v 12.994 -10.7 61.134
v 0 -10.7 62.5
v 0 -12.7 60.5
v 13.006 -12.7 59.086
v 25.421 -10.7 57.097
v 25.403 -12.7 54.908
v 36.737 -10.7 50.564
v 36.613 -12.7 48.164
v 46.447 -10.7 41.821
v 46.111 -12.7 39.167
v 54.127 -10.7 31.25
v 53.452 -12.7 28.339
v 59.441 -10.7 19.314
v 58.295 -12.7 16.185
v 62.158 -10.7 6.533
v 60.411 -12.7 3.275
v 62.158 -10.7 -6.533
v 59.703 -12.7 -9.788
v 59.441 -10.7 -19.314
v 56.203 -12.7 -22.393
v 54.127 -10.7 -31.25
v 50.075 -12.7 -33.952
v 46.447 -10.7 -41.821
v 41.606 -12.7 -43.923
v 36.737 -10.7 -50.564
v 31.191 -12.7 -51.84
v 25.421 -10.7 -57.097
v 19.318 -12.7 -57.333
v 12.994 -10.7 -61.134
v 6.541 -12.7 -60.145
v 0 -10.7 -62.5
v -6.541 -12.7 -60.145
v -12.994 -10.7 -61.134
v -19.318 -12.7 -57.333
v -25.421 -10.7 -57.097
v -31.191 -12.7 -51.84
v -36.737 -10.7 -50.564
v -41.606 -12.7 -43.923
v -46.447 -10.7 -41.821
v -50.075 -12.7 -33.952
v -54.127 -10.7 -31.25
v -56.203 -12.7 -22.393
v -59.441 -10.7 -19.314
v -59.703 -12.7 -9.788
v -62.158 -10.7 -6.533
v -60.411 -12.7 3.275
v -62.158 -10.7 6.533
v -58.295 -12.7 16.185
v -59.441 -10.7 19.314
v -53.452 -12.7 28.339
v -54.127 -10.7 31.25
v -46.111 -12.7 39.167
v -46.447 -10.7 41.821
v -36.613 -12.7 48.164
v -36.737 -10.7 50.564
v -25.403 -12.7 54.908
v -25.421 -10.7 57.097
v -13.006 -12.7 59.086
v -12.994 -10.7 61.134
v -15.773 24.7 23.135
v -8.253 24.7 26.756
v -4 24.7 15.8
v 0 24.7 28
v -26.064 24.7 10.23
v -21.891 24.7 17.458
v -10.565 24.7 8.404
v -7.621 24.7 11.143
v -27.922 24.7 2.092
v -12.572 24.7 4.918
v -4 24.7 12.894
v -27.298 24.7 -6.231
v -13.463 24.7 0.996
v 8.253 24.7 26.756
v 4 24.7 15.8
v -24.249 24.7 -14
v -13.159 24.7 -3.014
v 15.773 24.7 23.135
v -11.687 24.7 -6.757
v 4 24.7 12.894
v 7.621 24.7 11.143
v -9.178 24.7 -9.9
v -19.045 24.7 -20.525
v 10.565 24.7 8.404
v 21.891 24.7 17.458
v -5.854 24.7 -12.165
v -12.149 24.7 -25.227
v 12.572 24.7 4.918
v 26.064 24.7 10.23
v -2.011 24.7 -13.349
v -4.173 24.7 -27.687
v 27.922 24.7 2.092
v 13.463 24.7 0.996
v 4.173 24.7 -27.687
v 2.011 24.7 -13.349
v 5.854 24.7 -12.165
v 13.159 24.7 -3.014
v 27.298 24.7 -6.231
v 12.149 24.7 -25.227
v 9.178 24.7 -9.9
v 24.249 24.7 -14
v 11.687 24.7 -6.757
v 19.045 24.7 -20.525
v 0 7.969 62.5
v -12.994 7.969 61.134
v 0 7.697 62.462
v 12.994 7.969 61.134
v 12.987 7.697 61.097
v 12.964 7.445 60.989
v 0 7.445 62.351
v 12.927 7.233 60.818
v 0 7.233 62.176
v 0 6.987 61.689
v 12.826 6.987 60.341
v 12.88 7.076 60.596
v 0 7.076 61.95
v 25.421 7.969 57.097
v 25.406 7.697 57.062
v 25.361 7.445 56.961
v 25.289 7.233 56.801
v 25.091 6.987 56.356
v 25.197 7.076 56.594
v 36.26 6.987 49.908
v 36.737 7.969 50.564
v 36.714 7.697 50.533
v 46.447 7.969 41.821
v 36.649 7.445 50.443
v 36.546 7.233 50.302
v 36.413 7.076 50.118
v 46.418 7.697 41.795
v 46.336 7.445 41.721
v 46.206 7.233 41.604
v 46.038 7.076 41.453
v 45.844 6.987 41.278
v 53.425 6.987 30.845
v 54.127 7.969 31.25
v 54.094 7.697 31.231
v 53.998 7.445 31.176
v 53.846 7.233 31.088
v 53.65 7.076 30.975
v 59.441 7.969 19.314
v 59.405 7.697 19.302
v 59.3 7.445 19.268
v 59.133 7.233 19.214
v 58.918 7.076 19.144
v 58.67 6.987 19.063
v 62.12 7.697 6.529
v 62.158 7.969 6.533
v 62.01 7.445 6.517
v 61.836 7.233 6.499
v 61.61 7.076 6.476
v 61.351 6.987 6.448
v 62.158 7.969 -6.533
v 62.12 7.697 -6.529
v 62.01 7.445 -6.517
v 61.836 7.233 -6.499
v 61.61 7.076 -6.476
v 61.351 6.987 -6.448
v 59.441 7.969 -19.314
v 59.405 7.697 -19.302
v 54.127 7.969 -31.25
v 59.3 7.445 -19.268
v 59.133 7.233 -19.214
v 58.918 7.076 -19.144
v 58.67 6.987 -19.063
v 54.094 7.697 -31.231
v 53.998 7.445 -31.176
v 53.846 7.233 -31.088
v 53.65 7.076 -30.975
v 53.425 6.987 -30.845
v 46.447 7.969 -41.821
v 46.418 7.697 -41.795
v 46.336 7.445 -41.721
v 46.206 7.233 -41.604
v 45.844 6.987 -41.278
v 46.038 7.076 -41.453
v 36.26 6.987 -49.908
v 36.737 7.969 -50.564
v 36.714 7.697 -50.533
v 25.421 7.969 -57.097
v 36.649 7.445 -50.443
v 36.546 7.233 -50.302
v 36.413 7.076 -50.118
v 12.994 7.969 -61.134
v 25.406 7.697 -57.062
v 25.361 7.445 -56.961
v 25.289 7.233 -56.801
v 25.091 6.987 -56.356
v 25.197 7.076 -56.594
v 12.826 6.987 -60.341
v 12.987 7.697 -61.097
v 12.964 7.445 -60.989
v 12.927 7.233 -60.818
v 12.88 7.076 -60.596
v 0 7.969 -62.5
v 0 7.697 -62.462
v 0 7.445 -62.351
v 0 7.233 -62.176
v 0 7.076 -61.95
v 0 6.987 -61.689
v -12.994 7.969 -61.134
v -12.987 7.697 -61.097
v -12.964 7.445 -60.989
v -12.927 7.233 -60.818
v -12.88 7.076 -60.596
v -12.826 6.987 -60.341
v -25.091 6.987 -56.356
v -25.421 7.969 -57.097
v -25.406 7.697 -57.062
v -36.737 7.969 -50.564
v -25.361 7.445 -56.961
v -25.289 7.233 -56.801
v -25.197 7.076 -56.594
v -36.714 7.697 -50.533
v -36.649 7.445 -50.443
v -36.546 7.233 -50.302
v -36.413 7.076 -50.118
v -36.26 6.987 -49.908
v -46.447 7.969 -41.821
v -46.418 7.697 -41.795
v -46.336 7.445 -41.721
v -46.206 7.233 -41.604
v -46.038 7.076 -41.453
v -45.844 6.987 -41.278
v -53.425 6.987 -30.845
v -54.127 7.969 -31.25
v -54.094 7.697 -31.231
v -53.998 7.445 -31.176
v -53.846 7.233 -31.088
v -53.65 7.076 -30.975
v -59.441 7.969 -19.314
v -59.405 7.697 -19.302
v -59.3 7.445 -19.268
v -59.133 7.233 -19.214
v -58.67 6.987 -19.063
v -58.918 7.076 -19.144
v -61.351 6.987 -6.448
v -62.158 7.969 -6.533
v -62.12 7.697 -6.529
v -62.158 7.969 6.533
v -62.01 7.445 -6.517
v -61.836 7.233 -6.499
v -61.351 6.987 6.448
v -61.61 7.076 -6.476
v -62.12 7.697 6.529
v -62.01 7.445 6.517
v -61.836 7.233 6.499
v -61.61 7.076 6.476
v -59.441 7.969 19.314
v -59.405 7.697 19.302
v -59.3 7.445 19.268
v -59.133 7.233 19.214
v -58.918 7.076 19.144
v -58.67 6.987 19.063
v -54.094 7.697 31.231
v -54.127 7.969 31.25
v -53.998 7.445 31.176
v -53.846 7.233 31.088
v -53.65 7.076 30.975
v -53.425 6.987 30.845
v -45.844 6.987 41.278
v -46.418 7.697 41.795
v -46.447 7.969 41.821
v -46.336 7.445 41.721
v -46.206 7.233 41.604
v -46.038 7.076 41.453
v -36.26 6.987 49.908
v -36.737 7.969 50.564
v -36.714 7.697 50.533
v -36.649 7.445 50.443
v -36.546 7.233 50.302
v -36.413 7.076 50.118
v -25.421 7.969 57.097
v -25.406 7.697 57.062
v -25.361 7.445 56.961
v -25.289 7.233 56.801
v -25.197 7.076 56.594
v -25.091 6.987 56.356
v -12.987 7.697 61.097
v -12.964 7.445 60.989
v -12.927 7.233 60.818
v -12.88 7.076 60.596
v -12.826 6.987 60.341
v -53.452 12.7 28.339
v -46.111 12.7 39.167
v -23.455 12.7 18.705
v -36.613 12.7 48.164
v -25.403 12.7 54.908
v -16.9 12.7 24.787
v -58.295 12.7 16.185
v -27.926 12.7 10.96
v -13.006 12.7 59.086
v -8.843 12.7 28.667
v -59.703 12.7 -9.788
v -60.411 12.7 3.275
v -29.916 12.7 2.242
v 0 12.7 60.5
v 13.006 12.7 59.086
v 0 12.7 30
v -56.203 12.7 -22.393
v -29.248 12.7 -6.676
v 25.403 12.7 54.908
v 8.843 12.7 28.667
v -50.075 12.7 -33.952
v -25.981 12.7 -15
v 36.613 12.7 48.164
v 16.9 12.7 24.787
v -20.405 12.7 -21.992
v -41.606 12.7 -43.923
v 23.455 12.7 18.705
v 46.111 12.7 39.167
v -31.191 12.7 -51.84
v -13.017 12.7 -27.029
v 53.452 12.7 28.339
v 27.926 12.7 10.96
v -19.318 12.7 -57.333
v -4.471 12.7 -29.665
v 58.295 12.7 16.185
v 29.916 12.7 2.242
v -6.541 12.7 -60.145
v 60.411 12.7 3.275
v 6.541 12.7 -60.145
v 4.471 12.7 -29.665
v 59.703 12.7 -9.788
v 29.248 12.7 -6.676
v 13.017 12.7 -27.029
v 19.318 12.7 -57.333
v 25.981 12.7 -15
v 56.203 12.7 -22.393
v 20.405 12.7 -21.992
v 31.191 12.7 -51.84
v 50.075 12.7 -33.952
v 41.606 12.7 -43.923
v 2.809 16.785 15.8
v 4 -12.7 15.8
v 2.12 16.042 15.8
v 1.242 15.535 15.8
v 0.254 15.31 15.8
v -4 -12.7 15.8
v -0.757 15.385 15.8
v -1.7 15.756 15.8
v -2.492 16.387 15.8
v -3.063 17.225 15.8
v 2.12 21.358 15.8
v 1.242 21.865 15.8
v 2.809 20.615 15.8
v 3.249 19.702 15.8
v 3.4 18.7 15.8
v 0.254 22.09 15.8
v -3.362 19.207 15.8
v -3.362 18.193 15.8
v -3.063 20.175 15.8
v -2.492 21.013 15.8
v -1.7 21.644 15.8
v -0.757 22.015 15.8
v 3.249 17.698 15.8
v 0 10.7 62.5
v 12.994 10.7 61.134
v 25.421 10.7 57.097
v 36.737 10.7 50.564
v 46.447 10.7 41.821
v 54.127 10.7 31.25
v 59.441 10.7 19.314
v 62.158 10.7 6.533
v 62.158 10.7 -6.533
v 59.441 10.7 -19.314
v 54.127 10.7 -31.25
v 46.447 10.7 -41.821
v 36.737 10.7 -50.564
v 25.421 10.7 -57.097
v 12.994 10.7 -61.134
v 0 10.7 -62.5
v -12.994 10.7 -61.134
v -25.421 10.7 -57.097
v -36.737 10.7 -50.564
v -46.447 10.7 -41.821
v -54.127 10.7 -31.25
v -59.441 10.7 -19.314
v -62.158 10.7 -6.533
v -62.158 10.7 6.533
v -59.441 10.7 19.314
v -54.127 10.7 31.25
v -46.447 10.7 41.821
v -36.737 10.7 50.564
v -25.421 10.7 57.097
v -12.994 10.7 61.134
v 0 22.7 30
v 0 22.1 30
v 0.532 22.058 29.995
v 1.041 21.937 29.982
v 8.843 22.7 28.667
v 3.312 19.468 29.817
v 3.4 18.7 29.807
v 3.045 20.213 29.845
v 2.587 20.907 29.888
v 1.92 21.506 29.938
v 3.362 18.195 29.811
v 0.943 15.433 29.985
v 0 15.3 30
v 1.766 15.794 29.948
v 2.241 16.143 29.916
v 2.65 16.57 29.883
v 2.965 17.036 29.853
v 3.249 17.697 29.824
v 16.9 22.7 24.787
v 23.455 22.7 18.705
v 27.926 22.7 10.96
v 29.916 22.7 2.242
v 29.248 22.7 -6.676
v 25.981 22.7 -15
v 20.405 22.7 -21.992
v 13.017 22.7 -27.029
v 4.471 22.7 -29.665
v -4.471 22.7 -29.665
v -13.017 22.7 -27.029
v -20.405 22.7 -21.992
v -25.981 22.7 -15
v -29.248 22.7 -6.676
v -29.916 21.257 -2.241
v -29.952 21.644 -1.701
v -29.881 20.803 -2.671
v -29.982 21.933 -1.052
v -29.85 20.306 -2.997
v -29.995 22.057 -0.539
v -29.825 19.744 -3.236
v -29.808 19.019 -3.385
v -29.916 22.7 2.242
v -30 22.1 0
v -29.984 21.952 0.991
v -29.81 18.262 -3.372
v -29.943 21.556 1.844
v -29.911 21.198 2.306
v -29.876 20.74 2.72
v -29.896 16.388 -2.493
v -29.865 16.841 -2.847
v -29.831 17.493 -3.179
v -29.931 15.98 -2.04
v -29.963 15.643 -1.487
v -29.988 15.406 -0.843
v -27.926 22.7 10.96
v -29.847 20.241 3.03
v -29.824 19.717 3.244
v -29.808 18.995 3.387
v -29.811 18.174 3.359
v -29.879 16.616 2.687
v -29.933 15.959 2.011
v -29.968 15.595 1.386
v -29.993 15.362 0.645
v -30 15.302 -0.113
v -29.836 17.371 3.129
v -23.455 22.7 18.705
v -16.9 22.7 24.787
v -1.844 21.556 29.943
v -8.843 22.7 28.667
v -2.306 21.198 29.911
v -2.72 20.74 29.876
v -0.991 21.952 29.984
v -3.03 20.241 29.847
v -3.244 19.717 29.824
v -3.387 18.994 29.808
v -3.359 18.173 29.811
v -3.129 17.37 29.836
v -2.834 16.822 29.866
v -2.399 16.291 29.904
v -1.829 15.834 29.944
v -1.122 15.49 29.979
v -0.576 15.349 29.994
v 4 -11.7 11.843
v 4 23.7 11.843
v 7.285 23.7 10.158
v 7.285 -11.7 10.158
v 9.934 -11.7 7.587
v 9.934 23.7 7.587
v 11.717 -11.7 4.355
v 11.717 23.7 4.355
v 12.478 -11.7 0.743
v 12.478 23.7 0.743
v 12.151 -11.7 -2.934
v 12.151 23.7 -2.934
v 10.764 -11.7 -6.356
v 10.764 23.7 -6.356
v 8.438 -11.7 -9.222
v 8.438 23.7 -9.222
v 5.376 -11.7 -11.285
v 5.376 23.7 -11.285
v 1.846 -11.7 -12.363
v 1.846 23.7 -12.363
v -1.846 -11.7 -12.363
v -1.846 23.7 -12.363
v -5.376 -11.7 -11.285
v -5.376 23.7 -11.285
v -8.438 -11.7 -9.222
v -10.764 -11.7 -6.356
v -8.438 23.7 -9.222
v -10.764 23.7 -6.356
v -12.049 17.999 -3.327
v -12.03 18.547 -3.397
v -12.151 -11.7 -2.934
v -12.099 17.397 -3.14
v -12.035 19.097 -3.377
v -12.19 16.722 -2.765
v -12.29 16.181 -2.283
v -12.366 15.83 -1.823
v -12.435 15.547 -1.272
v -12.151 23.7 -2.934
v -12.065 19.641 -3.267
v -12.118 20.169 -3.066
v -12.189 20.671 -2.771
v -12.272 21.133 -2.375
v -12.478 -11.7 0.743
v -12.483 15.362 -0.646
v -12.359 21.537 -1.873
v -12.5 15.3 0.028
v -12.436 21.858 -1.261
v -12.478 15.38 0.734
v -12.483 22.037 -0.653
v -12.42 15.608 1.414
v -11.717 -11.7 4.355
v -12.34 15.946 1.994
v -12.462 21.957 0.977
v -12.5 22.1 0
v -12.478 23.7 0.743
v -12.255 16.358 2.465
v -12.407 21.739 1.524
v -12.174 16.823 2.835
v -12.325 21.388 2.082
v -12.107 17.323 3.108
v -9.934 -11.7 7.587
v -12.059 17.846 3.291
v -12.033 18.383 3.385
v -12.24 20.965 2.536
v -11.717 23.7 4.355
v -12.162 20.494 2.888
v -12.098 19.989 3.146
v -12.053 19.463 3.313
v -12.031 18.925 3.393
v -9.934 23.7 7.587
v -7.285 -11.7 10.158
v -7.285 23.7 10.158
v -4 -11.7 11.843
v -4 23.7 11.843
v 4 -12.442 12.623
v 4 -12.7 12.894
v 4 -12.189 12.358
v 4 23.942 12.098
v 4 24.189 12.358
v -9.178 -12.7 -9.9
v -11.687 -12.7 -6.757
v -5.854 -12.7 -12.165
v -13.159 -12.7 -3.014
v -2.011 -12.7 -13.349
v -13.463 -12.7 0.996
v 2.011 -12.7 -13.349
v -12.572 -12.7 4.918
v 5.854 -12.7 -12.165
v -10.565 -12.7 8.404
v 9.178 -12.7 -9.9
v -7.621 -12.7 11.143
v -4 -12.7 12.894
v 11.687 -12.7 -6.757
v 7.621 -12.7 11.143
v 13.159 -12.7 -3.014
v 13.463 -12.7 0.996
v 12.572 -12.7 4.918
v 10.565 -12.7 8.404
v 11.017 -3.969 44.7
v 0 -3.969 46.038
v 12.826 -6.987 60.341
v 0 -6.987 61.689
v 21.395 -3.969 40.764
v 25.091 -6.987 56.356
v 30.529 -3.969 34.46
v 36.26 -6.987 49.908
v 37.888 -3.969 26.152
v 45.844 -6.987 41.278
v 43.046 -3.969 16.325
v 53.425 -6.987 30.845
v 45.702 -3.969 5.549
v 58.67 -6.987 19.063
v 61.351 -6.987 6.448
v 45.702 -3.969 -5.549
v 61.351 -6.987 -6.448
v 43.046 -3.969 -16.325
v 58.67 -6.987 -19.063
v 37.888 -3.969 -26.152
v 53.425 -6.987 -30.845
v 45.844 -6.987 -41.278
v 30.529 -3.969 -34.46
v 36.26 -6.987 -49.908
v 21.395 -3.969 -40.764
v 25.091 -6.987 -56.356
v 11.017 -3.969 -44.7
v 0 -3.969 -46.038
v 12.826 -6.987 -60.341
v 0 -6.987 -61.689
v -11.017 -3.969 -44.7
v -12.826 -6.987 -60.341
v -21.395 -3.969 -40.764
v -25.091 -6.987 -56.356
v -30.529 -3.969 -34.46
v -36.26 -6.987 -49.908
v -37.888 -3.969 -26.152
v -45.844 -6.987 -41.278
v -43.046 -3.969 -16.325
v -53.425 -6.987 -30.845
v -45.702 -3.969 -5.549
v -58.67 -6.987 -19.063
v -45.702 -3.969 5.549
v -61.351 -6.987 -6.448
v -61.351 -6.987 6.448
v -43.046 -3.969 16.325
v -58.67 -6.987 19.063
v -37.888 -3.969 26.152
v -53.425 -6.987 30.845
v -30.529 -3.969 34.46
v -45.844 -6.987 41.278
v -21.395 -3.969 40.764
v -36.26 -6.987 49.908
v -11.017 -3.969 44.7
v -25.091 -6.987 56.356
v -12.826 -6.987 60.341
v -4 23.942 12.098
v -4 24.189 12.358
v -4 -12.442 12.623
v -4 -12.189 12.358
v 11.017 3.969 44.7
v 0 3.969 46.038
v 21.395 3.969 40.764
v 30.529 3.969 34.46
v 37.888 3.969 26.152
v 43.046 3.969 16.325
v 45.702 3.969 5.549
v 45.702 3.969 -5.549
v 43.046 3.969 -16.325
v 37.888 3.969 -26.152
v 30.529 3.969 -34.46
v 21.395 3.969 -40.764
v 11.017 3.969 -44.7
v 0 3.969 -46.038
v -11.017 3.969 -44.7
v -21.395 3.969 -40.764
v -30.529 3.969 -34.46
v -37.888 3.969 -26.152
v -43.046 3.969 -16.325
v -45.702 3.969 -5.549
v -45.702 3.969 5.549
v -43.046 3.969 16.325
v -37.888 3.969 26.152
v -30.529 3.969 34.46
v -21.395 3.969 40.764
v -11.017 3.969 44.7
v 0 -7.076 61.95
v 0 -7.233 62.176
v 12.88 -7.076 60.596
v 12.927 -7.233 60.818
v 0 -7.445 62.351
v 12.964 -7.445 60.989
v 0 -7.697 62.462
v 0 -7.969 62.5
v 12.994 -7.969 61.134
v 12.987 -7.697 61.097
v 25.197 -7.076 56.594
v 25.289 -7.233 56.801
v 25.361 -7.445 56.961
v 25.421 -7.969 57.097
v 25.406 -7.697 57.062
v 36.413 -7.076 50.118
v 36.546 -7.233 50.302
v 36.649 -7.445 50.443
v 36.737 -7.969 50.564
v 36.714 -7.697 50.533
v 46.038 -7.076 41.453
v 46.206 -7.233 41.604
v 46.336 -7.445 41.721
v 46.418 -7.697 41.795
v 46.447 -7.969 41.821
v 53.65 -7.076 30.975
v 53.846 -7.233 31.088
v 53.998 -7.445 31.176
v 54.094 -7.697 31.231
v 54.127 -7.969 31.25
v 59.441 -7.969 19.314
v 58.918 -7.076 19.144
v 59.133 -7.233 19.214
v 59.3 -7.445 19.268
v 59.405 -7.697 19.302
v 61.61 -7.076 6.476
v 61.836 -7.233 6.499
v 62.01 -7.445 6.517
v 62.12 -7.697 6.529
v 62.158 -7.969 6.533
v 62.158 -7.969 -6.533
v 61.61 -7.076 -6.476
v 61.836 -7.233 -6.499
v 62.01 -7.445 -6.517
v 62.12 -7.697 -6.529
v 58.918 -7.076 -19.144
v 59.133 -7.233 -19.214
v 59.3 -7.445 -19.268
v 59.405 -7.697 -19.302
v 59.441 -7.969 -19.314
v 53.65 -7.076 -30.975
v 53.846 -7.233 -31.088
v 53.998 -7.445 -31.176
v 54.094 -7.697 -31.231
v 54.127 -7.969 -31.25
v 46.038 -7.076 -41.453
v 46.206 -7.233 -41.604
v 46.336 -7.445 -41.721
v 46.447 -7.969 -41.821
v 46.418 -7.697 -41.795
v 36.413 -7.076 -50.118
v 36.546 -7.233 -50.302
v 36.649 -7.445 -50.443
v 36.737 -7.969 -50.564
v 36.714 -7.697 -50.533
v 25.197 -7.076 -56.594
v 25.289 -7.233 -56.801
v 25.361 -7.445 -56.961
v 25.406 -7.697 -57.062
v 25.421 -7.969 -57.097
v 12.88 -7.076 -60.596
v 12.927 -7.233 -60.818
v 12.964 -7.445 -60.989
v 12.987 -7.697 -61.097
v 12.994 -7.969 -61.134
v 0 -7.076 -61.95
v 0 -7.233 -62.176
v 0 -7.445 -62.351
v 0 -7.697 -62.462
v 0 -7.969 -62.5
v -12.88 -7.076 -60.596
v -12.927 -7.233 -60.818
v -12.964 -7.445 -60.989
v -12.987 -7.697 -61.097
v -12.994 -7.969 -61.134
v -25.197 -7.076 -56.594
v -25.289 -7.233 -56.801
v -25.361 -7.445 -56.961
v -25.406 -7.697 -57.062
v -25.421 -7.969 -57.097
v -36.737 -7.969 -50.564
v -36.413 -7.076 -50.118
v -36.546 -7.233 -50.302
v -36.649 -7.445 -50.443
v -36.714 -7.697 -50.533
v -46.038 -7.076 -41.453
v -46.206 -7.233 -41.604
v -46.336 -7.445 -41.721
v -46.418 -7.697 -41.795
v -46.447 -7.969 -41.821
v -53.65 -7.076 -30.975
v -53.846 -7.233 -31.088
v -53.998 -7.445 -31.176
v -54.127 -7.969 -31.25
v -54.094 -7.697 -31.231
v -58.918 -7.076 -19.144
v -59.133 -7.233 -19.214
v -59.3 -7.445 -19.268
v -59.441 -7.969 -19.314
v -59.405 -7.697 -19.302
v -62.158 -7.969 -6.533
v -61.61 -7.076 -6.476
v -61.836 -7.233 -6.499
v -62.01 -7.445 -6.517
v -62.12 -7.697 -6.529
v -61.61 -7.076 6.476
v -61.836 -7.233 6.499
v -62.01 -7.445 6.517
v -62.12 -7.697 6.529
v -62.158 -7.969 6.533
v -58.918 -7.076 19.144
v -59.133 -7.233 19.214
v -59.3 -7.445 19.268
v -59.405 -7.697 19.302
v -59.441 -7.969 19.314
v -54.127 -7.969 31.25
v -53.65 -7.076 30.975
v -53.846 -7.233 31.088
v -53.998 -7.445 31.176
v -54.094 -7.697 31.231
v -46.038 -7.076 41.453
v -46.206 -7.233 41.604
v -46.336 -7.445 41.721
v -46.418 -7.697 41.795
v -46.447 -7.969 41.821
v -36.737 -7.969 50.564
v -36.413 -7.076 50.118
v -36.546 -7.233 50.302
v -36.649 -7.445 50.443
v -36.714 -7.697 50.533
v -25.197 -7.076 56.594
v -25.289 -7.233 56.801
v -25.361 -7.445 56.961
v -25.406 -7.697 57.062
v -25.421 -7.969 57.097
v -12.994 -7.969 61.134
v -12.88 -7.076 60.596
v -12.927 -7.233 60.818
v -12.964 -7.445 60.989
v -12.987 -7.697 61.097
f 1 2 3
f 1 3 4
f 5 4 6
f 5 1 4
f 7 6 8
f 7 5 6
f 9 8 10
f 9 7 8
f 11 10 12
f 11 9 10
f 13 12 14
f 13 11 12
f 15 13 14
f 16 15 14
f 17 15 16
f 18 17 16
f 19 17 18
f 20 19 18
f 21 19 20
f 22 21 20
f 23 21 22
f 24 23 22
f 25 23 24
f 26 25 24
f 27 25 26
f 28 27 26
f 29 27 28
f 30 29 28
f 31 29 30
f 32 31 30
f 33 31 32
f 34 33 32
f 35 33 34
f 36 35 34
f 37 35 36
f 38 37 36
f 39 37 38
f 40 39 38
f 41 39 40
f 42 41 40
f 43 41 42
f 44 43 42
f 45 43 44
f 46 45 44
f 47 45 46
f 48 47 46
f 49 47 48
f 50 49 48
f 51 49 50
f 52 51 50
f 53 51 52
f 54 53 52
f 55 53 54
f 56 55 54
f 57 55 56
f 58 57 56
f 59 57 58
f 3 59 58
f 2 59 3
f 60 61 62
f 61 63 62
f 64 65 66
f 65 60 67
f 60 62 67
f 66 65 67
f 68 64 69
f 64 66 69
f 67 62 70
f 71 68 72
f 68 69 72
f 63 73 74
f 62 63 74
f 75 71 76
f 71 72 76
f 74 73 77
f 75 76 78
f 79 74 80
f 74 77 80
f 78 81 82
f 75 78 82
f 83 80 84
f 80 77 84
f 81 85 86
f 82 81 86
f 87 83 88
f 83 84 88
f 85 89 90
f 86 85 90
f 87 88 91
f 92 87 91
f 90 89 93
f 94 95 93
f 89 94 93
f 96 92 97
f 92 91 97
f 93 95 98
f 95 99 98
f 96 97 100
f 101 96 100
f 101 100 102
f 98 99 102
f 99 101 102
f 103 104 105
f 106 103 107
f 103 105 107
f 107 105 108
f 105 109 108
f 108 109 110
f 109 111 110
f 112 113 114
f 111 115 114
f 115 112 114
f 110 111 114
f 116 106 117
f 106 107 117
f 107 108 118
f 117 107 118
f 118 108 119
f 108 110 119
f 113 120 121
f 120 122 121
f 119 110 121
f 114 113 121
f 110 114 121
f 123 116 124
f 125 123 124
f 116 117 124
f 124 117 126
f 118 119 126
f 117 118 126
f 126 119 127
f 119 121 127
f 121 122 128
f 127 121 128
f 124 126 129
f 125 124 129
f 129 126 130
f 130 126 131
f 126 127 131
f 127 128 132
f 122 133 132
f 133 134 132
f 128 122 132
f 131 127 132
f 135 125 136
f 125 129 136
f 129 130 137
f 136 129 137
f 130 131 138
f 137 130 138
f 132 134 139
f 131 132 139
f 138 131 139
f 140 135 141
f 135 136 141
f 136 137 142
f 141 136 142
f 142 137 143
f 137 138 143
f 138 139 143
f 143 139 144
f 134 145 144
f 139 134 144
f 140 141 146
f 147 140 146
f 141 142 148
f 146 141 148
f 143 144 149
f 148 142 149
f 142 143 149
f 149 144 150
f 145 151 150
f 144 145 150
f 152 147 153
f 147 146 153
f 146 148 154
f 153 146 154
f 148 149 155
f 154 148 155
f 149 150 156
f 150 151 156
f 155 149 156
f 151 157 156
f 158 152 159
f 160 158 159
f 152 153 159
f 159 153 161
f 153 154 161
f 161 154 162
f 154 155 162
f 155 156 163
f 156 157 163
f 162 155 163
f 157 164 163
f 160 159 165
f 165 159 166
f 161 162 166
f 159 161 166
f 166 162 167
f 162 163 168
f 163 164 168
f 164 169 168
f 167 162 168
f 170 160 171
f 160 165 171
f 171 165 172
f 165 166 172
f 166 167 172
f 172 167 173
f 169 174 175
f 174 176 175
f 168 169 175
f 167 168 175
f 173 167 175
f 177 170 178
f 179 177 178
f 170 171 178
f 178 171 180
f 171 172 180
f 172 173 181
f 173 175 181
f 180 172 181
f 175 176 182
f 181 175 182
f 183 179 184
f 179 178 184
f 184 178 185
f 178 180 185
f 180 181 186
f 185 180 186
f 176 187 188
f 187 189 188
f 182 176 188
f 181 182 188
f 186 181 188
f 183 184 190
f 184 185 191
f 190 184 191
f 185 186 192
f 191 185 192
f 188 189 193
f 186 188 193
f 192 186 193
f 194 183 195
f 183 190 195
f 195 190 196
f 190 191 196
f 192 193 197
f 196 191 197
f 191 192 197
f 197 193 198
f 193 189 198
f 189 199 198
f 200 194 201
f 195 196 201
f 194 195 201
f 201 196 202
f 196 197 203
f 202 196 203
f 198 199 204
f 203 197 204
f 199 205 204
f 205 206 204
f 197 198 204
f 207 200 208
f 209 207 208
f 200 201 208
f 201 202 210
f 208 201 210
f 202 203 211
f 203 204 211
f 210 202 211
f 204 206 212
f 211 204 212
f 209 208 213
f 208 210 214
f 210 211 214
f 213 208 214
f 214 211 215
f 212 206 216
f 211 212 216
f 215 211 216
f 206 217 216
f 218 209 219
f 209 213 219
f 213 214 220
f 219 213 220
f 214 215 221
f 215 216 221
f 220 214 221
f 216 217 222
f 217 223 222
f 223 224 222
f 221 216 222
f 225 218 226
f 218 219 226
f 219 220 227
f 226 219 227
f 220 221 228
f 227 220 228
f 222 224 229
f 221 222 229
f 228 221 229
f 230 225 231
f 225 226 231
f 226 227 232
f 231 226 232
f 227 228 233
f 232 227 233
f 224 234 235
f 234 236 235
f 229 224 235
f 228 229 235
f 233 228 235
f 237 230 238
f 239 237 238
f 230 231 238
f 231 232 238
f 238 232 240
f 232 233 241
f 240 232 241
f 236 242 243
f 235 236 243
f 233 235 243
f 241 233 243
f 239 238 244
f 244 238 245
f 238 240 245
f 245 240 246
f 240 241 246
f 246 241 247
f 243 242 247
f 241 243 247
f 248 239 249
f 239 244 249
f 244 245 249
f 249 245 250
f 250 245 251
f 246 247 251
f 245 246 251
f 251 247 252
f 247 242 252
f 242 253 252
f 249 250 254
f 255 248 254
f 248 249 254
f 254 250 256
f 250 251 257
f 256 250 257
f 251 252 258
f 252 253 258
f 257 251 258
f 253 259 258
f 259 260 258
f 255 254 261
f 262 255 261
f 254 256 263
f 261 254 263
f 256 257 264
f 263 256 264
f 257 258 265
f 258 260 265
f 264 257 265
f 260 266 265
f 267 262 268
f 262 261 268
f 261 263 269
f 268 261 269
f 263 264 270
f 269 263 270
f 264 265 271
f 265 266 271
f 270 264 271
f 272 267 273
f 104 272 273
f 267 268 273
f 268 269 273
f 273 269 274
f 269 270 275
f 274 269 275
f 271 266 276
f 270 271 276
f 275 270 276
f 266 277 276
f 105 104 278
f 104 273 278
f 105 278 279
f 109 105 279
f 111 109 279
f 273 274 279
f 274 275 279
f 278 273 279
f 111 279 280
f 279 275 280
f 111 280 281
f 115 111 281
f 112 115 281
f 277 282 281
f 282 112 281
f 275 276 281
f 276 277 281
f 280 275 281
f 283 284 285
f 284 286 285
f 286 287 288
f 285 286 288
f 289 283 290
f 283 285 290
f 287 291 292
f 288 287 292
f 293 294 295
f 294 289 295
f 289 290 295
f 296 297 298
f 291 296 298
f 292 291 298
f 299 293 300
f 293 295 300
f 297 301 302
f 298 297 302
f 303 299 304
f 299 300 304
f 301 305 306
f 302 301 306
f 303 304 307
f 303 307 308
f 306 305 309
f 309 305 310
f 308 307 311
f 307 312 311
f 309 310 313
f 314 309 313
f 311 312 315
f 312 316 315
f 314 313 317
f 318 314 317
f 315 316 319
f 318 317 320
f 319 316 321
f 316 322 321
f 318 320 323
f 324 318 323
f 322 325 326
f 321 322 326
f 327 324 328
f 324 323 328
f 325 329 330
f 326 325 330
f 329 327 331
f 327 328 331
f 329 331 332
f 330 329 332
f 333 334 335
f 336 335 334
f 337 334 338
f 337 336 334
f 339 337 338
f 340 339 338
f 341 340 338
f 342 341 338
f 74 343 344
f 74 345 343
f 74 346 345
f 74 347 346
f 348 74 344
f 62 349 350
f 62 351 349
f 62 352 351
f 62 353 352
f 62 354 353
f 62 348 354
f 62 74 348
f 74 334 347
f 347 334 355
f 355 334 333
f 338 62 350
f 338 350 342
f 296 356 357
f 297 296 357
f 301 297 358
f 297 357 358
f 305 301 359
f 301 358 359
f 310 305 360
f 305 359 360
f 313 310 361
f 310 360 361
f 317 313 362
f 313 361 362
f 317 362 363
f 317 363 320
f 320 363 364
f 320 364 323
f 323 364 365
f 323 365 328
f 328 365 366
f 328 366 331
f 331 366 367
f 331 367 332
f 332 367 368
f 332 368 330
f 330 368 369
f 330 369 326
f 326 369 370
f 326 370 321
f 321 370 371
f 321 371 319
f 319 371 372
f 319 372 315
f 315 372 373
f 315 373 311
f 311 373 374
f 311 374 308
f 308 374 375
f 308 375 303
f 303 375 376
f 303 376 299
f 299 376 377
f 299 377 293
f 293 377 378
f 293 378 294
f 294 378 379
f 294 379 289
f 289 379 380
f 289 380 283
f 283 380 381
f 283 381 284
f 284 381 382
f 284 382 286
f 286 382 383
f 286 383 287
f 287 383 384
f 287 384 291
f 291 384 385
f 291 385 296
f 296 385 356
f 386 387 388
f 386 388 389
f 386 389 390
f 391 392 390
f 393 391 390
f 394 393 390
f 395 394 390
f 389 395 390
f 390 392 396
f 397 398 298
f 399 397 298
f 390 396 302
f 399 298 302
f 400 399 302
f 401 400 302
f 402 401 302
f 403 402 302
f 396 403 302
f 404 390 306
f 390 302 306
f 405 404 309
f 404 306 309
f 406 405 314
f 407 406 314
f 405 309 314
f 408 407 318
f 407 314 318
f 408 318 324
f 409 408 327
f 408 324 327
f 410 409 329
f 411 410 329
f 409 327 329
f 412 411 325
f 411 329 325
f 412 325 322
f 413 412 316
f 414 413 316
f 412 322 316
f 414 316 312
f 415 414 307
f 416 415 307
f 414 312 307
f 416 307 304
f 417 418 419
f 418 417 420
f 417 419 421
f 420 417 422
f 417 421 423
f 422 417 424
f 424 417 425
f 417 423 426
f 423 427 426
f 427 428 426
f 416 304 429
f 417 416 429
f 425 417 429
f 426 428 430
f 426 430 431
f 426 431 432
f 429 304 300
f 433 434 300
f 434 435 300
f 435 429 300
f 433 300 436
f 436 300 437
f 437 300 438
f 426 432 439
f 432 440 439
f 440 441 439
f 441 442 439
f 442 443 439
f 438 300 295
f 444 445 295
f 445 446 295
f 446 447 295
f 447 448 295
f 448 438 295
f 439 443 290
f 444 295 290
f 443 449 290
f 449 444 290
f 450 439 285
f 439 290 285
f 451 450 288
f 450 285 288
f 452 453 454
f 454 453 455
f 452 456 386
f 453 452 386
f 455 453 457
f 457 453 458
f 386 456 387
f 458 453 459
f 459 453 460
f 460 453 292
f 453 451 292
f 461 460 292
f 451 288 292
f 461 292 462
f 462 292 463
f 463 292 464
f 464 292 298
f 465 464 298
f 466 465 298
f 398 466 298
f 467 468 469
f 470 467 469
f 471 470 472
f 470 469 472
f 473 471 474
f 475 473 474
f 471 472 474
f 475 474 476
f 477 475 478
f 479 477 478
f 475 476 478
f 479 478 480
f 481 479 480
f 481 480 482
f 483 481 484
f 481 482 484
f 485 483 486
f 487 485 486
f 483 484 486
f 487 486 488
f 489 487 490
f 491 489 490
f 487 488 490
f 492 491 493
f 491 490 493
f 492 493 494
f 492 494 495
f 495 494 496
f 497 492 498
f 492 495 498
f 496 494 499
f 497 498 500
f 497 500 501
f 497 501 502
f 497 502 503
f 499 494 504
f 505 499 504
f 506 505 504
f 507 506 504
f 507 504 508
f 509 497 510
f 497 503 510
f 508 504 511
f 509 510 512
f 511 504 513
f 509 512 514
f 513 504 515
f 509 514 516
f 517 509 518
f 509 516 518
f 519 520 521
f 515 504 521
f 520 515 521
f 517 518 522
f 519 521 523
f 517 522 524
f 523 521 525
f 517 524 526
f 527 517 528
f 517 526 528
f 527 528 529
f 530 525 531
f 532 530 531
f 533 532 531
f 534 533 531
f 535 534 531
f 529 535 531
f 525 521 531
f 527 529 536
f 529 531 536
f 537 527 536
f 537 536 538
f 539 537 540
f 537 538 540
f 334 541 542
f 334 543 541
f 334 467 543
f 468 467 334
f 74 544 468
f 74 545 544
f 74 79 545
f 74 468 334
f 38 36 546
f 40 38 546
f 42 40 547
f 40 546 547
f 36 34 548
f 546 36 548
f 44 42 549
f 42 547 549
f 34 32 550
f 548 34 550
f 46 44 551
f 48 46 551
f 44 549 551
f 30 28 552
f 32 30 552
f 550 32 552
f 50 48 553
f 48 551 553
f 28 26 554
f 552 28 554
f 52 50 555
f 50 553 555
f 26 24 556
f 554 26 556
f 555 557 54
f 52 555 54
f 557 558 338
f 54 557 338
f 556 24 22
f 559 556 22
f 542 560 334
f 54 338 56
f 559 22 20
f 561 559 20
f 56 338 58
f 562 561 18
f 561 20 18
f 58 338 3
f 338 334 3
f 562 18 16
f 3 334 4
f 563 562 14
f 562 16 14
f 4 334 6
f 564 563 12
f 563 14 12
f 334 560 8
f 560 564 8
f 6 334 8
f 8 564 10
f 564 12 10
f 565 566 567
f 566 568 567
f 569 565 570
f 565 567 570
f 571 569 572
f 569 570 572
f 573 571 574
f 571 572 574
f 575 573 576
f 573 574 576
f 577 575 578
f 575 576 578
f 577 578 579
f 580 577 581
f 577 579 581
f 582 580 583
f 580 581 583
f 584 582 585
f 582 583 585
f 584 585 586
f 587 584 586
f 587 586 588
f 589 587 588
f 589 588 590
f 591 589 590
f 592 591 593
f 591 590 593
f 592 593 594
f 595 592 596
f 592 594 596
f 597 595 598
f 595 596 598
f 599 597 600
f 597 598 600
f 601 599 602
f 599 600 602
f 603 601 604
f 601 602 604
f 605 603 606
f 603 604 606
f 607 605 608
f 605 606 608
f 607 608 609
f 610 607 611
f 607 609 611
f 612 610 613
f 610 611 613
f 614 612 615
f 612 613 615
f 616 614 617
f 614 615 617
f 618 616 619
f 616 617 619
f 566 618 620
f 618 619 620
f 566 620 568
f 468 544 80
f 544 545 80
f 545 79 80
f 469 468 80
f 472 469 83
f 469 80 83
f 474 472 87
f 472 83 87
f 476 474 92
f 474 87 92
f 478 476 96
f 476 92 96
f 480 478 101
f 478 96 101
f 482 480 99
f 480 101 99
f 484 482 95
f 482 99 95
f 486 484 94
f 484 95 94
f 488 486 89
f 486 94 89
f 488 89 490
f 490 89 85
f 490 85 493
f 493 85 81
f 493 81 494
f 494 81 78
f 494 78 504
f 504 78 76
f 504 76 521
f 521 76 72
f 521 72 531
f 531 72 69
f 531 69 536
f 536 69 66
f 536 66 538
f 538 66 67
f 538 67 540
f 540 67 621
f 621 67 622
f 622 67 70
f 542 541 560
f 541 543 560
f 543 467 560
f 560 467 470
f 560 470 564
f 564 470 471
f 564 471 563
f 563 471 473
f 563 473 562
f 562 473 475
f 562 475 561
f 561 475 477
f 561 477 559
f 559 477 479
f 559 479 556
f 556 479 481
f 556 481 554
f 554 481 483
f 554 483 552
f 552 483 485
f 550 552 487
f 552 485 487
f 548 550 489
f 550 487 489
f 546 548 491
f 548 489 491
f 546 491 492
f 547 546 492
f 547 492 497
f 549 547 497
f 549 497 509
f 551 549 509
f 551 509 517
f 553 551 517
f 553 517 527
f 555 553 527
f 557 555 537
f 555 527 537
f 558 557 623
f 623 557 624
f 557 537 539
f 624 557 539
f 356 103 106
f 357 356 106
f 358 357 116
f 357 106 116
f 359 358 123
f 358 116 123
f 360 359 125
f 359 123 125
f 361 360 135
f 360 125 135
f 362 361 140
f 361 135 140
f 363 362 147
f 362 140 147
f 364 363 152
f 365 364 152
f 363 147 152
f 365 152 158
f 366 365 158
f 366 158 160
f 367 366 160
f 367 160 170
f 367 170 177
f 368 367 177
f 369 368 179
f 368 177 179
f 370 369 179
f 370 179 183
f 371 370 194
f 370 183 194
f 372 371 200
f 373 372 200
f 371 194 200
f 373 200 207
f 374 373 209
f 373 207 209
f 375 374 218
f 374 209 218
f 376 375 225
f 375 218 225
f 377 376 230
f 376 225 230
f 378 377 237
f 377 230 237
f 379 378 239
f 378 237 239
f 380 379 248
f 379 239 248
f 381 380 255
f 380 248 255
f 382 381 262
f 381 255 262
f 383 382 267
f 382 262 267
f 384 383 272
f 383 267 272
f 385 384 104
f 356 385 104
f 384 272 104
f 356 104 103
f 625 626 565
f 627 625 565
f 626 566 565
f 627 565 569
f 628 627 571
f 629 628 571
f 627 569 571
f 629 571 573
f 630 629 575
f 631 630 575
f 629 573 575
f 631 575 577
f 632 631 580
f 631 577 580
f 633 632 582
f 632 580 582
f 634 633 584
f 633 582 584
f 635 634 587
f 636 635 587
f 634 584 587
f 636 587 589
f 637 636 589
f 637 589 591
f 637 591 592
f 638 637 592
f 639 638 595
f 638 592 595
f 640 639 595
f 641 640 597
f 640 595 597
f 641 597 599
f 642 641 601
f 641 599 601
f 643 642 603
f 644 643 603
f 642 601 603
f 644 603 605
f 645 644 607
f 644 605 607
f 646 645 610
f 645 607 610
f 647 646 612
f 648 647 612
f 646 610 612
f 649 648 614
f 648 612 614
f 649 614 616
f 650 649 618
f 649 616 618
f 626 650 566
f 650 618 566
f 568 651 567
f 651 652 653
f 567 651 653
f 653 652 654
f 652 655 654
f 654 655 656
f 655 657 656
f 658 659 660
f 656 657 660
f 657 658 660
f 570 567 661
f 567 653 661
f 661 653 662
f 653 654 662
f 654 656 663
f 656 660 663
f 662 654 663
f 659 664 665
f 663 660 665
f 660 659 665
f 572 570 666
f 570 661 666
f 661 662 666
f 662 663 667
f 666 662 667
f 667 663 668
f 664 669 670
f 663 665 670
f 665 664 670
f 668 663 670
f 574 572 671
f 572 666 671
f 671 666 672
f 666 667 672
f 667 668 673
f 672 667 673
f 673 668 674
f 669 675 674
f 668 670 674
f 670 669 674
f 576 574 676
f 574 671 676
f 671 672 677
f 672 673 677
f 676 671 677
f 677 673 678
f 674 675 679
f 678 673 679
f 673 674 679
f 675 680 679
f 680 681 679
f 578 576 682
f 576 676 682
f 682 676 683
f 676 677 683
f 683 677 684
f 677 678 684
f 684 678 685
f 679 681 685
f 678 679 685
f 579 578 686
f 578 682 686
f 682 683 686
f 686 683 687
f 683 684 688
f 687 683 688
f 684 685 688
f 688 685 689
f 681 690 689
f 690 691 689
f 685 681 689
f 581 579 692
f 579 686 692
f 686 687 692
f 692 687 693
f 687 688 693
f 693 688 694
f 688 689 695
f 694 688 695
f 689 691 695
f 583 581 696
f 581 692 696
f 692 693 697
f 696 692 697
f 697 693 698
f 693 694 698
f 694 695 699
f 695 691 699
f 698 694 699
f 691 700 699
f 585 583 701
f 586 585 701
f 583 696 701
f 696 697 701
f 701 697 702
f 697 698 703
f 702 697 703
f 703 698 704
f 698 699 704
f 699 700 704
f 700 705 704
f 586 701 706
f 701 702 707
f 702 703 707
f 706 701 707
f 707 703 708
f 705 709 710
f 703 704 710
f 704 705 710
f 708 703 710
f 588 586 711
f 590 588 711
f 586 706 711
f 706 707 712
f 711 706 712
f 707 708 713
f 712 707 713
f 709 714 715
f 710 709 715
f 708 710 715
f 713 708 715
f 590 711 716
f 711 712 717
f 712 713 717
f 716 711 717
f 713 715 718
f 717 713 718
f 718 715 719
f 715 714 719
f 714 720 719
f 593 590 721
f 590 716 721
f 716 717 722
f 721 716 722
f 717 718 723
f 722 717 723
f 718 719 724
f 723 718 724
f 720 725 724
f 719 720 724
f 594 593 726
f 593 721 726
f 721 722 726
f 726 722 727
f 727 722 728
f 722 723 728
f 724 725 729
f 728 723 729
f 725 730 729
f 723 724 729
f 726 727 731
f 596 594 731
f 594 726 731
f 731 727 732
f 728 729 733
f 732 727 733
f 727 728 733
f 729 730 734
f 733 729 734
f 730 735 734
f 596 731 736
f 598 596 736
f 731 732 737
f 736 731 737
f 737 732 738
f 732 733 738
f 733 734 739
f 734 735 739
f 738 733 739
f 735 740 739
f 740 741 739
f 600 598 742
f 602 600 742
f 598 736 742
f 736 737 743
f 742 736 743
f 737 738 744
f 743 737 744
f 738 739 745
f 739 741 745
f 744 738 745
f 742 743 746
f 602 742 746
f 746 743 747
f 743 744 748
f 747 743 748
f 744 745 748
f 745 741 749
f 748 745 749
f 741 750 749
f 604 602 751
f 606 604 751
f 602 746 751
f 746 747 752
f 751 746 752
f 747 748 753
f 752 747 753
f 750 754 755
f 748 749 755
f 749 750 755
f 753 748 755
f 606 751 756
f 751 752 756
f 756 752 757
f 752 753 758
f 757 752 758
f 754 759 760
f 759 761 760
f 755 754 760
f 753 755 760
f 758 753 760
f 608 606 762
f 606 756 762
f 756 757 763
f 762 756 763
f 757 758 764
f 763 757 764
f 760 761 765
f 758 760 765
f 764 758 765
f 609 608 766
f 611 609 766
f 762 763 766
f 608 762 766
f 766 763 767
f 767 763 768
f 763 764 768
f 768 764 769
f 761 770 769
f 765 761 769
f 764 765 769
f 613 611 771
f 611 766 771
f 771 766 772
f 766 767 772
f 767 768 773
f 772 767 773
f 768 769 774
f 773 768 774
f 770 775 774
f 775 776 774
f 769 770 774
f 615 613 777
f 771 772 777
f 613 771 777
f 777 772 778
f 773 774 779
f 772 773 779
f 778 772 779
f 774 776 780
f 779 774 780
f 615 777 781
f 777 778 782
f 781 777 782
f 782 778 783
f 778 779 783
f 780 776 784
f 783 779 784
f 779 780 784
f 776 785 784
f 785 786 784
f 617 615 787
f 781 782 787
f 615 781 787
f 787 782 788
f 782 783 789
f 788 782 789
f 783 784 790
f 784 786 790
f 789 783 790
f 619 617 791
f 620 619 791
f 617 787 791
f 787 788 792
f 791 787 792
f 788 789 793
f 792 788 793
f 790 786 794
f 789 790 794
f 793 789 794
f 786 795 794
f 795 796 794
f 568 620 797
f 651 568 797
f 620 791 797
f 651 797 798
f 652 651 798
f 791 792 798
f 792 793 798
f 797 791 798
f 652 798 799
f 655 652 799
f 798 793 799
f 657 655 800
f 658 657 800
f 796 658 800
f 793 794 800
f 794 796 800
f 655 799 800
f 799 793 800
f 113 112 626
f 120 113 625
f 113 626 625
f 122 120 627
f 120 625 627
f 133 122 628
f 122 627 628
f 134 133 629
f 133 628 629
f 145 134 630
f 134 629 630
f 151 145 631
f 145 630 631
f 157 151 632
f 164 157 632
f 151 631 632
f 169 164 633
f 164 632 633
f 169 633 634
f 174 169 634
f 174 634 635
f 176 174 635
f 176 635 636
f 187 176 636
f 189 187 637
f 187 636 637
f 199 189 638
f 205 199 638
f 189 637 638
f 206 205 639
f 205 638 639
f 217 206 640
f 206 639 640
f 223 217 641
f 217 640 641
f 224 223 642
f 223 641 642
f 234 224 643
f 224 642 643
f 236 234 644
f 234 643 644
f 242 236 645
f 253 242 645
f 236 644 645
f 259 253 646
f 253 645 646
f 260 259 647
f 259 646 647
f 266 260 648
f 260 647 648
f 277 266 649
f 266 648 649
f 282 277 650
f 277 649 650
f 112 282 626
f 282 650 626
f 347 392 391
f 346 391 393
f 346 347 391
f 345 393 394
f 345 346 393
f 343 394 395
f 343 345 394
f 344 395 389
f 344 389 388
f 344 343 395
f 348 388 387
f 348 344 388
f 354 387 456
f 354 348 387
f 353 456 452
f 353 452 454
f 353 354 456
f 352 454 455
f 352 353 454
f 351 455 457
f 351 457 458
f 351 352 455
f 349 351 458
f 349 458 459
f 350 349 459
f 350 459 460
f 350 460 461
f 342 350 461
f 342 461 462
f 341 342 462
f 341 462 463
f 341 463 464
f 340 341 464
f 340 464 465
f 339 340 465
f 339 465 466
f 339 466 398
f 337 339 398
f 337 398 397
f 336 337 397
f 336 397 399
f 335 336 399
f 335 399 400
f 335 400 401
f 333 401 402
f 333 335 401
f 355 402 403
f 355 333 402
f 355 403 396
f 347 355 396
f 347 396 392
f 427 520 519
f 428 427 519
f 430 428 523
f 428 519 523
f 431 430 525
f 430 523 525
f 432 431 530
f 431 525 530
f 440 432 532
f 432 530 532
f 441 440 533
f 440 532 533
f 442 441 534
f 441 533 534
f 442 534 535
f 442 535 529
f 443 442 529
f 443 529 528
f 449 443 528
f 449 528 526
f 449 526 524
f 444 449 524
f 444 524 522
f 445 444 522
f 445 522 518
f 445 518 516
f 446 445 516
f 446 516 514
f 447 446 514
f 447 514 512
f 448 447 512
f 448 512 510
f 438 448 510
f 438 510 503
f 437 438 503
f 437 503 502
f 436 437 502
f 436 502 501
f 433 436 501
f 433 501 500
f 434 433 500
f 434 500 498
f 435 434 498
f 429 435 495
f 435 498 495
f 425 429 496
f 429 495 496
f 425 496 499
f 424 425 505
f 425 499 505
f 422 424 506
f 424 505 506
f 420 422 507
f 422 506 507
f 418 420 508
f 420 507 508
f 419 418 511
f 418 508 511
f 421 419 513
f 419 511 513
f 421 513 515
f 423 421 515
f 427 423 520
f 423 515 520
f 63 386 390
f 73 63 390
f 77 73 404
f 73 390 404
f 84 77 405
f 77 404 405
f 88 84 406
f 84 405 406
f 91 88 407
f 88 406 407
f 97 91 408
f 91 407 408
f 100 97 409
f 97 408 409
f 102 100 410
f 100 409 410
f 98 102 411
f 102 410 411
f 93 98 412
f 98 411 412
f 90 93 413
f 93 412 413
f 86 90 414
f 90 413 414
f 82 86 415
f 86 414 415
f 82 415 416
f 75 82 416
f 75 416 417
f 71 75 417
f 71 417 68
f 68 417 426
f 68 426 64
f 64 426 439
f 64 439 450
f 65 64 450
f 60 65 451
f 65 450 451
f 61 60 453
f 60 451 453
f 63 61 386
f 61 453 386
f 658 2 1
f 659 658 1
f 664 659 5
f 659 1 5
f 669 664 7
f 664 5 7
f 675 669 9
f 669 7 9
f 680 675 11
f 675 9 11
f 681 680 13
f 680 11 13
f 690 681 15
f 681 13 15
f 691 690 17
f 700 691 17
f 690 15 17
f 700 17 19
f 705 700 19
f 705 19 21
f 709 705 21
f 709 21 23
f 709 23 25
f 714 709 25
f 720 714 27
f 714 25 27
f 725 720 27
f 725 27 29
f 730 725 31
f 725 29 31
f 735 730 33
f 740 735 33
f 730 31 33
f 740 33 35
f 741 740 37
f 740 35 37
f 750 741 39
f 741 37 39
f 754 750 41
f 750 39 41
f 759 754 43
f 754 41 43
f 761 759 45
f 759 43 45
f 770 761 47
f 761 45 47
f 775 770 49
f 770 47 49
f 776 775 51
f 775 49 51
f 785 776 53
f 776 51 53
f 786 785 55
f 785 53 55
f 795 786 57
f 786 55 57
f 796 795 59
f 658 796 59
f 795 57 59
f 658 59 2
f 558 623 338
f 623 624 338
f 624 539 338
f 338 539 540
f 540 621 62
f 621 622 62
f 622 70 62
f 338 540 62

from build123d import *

# Parameters (mm, degrees)
F2_SIZE  = 2
F3_SIZE  = 2
F4_W     = 8
F4_H     = 6.6
F5_DEPTH = 37.401
F6_R     = 3.4
F7_DEPTH = 62.501
F8_R     = 3.4
F9_DEPTH = 62.501
F10_SIZE = 1
F11_SIZE = 2


with BuildPart() as f1:
    # F0 (on Right) → F1 (revolve)
    with BuildSketch(Plane.YZ):
        with BuildLine():
            Line((-12.7, 62.5), (-12.7, 12.5))
            Line((-12.7, 12.5), (12.7, 12.5))
            Line((12.7, 12.5), (24.7, 12.5))
            Line((24.7, 12.5), (24.7, 30))
            Line((24.7, 30), (12.7, 30))
            Line((12.7, 30), (12.7, 62.5))
            Line((12.7, 62.5), (7.969316, 62.5))
            ThreePointArc((7.969316, 62.5), (7.332673, 62.271159), (6.98741, 61.689373))
            Line((6.98741, 61.689373), (3.96875, 46.0375))
            Line((3.96875, 46.0375), (0, 46.0375))
            Line((0, 46.0375), (-3.96875, 46.0375))
            Line((-3.96875, 46.0375), (-6.98741, 61.689373))
            ThreePointArc((-6.98741, 61.689373), (-7.332673, 62.271159), (-7.969316, 62.5))
            Line((-7.969316, 62.5), (-12.7, 62.5))
        make_face()
    revolve(axis=Axis((0, -1.982494, 0), (0, 1, 0)))

    # F2
    f2_edges = [f1.edges().sort_by_distance(p)[0] for p in [
        (0, 12.7, -62.5),
    ]]
    chamfer(f2_edges, length=F2_SIZE)

    # F3
    f3_edges = [f1.edges().sort_by_distance(p)[0] for p in [
        (0, -12.7, -62.5),
    ]]
    chamfer(f3_edges, length=F3_SIZE)

    # F4 (on face) → F5 (cut, through all)
    with BuildSketch(Plane(origin=(0, 24.7, 0), x_dir=(-1, 0, 0), z_dir=(0, 1, 0))):
        with Locations((0, 12.5)):
            Rectangle(F4_W, F4_H)
    extrude(amount=-F5_DEPTH, mode=Mode.SUBTRACT)

    # F6 (on Top) → F7 (cut, through all)
    with BuildSketch(Plane.XY):
        with Locations((0, 18.7)):
            Circle(F6_R)
    extrude(amount=F7_DEPTH, mode=Mode.SUBTRACT)

    # F8 (on Right) → F9 (cut, through all)
    with BuildSketch(Plane.YZ):
        with Locations((18.7, 0)):
            Circle(F8_R)
    extrude(amount=-F9_DEPTH, mode=Mode.SUBTRACT)

    # F10
    f10_edges = [f1.edges().sort_by_distance(p)[0] for p in [
        (0, 24.7, -12.5),
        (0, -12.7, -12.5),
    ]]
    chamfer(f10_edges, length=F10_SIZE)

    # F11
    f11_edges = [f1.edges().sort_by_distance(p)[0] for p in [
        (0, 24.7, -30),
    ]]
    chamfer(f11_edges, length=F11_SIZE)


solid = f1.part
